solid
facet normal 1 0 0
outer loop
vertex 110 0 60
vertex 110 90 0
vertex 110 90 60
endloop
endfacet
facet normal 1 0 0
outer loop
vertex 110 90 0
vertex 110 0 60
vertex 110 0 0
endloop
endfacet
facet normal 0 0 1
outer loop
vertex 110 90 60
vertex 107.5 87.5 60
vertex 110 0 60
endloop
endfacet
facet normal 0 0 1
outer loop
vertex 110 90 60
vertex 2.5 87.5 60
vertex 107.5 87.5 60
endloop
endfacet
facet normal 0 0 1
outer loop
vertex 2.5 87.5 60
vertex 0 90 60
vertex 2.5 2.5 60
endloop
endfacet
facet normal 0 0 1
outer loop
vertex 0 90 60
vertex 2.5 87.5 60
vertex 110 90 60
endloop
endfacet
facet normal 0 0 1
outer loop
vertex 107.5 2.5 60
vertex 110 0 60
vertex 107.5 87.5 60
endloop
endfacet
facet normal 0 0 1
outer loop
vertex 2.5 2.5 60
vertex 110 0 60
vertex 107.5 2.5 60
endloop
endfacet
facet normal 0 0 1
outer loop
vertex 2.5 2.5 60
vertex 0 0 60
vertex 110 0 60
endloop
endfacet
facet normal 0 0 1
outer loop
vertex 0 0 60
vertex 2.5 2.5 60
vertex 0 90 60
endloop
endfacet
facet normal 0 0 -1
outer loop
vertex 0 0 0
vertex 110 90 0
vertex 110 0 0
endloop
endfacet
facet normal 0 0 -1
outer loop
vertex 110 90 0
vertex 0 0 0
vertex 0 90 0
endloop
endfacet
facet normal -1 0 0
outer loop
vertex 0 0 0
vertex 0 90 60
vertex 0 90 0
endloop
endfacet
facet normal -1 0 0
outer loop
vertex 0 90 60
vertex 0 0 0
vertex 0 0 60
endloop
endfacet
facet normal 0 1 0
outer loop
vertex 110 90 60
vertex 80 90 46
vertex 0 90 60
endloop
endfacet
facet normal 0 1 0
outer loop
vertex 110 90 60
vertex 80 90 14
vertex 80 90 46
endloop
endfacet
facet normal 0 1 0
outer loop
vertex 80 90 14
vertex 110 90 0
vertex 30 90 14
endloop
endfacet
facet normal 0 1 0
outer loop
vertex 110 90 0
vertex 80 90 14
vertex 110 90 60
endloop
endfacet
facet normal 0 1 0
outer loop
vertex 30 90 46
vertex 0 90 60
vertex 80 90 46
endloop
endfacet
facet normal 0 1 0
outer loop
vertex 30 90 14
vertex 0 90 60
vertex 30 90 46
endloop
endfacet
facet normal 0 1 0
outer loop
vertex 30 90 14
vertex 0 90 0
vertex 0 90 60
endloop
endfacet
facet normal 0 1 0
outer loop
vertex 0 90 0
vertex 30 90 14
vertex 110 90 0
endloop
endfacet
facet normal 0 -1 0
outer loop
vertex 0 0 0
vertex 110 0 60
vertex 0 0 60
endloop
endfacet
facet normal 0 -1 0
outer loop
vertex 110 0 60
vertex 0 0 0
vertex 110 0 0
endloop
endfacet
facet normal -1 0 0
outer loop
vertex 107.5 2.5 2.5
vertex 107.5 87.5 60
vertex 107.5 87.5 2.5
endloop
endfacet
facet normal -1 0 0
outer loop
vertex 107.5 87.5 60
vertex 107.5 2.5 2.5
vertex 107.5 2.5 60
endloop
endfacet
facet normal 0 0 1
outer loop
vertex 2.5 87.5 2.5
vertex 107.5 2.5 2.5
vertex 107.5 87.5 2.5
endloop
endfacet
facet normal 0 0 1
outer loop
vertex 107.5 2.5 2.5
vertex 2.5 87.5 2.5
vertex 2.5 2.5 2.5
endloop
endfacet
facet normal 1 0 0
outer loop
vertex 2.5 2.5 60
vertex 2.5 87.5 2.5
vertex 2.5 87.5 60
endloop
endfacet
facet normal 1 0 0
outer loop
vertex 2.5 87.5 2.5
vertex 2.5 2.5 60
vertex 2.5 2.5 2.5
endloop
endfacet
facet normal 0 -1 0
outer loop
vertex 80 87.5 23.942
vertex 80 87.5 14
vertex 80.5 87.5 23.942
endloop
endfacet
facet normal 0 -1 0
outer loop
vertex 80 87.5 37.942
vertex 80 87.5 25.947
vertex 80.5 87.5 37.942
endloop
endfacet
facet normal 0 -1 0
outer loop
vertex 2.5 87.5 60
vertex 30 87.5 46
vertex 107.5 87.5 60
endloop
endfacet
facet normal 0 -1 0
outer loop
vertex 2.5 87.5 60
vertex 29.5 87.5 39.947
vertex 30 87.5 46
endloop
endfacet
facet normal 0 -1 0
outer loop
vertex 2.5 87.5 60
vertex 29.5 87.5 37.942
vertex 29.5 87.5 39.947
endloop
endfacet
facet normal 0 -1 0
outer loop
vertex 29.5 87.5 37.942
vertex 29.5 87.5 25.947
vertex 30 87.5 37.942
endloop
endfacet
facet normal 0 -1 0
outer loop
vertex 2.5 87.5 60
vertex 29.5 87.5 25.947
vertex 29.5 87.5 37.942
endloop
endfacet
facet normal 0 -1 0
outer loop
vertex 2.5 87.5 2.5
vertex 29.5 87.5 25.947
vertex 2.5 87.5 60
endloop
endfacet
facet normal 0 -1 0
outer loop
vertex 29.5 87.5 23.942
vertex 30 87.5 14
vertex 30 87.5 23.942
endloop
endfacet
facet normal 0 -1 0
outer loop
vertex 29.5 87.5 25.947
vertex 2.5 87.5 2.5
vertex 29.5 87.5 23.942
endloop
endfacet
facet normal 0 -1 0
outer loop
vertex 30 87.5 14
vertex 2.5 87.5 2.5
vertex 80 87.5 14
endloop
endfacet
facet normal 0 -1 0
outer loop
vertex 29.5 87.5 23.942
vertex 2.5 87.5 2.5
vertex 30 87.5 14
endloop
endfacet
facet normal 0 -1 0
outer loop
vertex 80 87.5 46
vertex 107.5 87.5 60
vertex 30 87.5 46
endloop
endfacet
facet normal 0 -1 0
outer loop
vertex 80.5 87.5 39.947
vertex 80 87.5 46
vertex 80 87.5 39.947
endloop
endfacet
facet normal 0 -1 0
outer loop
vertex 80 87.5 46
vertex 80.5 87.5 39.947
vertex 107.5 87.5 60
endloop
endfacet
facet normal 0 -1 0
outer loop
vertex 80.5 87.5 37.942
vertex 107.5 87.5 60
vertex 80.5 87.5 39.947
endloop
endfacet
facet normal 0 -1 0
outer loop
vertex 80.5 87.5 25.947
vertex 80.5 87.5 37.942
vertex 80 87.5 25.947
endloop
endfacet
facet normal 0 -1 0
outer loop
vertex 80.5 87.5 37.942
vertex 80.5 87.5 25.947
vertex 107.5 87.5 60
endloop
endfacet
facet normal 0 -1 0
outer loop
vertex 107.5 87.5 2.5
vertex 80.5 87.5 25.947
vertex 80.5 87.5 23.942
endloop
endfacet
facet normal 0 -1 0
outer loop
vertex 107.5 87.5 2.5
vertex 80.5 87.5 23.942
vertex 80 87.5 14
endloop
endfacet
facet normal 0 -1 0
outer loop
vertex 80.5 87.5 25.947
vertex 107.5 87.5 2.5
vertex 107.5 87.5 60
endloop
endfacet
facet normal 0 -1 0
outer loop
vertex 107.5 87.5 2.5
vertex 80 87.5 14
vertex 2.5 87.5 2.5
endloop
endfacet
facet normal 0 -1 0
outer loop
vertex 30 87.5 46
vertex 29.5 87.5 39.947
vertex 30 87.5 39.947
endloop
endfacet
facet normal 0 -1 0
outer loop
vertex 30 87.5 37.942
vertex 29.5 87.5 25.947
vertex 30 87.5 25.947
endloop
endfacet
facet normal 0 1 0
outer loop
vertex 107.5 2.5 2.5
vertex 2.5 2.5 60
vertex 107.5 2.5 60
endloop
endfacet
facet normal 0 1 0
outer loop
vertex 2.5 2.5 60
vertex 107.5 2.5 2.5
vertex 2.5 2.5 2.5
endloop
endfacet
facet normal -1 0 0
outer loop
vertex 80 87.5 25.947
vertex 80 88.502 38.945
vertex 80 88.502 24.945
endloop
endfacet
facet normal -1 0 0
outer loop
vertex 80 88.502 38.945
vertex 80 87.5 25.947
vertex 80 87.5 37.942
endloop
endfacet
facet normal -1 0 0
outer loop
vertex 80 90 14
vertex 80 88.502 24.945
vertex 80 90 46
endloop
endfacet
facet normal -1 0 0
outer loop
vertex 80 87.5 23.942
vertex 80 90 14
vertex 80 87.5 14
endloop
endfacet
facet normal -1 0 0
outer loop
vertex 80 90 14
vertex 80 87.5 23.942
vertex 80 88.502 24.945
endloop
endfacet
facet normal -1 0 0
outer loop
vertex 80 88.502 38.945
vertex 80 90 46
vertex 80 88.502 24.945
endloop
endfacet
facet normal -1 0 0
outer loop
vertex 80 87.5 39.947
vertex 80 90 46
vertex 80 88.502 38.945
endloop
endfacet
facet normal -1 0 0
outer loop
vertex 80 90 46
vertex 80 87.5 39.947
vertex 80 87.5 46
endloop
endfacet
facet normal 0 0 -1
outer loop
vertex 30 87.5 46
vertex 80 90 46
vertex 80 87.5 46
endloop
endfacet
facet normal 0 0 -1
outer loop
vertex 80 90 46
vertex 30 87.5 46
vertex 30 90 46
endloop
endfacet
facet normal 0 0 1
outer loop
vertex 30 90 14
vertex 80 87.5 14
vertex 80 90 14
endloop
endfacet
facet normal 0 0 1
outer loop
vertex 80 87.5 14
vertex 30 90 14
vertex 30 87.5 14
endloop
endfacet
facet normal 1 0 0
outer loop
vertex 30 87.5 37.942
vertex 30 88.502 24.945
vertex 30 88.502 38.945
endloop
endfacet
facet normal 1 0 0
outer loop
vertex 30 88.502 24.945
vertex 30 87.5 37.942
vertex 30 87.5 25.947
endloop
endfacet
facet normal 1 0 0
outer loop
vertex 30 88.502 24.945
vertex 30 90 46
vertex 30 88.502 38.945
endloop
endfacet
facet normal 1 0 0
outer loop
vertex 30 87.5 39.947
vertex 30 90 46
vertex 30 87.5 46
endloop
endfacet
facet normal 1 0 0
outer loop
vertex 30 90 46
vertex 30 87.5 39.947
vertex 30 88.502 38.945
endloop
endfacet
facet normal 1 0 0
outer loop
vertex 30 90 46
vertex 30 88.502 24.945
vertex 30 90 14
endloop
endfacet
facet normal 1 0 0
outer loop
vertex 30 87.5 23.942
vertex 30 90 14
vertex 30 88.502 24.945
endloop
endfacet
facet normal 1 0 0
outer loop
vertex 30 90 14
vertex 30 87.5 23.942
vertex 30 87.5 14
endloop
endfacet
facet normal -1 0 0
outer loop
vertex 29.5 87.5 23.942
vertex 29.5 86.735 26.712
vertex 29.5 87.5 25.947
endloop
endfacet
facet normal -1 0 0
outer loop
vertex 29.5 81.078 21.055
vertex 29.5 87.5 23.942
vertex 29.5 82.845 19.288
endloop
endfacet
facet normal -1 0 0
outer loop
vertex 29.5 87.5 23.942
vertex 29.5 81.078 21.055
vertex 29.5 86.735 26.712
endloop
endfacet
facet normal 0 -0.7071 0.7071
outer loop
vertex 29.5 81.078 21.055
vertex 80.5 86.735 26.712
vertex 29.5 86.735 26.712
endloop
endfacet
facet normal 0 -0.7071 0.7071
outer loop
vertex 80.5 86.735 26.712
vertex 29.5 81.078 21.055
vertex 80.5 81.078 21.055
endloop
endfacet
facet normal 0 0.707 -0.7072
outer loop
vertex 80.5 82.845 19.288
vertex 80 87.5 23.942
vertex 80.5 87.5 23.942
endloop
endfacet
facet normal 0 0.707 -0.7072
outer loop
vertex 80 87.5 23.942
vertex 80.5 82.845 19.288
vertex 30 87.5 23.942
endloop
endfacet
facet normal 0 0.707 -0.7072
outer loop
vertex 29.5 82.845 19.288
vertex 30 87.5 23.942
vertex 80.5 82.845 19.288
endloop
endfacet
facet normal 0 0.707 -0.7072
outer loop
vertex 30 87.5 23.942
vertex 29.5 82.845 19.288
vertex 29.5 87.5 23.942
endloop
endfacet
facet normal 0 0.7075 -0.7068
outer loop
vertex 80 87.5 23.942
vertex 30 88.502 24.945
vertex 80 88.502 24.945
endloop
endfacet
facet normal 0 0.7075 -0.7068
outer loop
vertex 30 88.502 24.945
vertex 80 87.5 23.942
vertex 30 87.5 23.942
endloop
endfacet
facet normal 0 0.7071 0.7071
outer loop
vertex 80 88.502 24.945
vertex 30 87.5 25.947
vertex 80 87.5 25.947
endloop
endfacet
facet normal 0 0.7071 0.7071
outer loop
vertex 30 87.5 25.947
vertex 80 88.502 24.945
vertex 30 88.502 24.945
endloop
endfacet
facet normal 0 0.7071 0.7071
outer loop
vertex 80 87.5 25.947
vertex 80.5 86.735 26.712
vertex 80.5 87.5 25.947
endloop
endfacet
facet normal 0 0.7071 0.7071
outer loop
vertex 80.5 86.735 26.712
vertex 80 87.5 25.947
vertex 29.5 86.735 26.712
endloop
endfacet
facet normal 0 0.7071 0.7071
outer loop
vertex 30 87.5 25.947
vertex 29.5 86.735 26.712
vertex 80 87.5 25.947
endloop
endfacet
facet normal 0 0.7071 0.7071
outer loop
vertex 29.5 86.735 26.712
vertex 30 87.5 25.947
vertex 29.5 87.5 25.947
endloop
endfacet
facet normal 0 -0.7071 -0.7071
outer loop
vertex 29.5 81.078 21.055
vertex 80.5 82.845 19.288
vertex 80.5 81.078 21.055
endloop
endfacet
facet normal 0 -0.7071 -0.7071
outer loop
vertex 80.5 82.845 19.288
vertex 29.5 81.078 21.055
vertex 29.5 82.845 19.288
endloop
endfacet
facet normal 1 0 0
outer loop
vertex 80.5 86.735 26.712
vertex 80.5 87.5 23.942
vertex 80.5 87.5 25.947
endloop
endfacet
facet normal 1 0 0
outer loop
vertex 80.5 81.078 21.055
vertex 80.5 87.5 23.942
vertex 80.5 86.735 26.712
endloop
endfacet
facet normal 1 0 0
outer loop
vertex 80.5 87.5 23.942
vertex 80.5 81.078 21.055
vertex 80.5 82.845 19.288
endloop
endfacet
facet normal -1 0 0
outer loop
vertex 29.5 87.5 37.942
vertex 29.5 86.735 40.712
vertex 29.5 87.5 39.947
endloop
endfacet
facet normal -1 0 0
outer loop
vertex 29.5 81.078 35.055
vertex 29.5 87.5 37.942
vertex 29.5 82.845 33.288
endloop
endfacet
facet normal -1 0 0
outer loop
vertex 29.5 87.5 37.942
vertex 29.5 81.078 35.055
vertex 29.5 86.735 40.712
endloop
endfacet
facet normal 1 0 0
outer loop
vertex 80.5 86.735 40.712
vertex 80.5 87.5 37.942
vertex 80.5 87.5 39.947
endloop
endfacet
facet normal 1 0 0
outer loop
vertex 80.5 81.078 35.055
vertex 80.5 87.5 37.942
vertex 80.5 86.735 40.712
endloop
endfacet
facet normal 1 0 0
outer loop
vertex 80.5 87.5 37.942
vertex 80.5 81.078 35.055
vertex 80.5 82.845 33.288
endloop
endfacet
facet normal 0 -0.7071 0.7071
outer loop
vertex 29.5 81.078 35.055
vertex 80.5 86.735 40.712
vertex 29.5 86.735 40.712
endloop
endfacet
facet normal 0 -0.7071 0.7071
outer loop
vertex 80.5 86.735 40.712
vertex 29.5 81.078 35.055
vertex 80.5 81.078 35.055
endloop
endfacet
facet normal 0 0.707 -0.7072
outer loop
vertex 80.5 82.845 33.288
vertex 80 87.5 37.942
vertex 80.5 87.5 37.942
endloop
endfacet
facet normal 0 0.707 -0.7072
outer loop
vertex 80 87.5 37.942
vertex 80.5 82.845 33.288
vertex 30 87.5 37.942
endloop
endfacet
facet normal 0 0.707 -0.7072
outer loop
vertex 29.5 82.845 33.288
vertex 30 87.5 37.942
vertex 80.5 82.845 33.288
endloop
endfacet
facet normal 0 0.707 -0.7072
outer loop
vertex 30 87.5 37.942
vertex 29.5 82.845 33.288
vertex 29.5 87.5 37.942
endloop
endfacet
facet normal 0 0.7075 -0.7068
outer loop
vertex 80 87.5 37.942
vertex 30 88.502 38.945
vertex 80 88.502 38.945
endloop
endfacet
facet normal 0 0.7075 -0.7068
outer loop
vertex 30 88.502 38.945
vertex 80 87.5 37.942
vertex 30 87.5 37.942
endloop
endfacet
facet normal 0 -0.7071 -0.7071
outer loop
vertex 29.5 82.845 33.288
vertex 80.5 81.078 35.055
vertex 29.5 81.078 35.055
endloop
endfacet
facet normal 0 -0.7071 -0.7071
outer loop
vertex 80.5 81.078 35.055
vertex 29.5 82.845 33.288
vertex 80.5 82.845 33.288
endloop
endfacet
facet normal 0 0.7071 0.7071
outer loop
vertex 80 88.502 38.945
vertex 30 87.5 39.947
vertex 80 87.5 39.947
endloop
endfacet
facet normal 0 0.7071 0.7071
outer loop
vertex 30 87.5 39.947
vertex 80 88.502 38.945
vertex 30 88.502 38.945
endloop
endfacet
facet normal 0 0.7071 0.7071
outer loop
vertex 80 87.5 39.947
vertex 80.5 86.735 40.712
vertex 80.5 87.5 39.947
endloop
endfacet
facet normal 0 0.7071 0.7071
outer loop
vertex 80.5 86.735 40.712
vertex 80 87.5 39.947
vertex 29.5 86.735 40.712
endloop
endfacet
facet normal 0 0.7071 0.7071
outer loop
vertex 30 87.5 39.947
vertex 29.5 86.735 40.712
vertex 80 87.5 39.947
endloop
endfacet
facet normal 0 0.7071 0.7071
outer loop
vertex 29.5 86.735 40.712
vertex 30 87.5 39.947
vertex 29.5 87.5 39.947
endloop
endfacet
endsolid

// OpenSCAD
$fn = 32;

// ----------------------------------------------------------------------
// Vent box: louvers enclosure
// ----------------------------------------------------------------------

// --- parameters (mm) ---
box_l = 110;              // box length, X
box_w = 90;               // box width, Y
box_h = 60;               // box height, Z
wall_t = 2.5;             // shell wall thickness
win_l = 50;               // vent window width, X
win_h = 32;               // vent window height, Z
slat_t = 2.5;             // louver slat thickness
slat_d = 8;               // louver slat depth
slat_a = 45;              // louver slat angle, degrees
slat_pitch = 14;          // louver pitch
slat_yc = 84.79;          // slat centreline Y

win_z0 = (box_h - win_h) / 2;  // window lower edge Z
n_slats = 2;  // louver count
slat_z0 = win_z0 + (win_h - (n_slats - 1) * slat_pitch) / 2;

difference() {
  union() {
    difference() {
      cube([box_l, box_w, box_h]);
  translate([wall_t, wall_t, wall_t])
    cube([box_l - 2 * wall_t, box_w - 2 * wall_t, box_h]);
  translate([(box_l - win_l) / 2, box_w - wall_t - 1, win_z0])
    cube([win_l, wall_t + 2, win_h]);
    }
    for (i = [0 : n_slats - 1])
      translate([box_l / 2, slat_yc, slat_z0 + i * slat_pitch])
        rotate([slat_a, 0, 0])
          cube([win_l + 1, slat_d, slat_t], center = true);
  }
}
